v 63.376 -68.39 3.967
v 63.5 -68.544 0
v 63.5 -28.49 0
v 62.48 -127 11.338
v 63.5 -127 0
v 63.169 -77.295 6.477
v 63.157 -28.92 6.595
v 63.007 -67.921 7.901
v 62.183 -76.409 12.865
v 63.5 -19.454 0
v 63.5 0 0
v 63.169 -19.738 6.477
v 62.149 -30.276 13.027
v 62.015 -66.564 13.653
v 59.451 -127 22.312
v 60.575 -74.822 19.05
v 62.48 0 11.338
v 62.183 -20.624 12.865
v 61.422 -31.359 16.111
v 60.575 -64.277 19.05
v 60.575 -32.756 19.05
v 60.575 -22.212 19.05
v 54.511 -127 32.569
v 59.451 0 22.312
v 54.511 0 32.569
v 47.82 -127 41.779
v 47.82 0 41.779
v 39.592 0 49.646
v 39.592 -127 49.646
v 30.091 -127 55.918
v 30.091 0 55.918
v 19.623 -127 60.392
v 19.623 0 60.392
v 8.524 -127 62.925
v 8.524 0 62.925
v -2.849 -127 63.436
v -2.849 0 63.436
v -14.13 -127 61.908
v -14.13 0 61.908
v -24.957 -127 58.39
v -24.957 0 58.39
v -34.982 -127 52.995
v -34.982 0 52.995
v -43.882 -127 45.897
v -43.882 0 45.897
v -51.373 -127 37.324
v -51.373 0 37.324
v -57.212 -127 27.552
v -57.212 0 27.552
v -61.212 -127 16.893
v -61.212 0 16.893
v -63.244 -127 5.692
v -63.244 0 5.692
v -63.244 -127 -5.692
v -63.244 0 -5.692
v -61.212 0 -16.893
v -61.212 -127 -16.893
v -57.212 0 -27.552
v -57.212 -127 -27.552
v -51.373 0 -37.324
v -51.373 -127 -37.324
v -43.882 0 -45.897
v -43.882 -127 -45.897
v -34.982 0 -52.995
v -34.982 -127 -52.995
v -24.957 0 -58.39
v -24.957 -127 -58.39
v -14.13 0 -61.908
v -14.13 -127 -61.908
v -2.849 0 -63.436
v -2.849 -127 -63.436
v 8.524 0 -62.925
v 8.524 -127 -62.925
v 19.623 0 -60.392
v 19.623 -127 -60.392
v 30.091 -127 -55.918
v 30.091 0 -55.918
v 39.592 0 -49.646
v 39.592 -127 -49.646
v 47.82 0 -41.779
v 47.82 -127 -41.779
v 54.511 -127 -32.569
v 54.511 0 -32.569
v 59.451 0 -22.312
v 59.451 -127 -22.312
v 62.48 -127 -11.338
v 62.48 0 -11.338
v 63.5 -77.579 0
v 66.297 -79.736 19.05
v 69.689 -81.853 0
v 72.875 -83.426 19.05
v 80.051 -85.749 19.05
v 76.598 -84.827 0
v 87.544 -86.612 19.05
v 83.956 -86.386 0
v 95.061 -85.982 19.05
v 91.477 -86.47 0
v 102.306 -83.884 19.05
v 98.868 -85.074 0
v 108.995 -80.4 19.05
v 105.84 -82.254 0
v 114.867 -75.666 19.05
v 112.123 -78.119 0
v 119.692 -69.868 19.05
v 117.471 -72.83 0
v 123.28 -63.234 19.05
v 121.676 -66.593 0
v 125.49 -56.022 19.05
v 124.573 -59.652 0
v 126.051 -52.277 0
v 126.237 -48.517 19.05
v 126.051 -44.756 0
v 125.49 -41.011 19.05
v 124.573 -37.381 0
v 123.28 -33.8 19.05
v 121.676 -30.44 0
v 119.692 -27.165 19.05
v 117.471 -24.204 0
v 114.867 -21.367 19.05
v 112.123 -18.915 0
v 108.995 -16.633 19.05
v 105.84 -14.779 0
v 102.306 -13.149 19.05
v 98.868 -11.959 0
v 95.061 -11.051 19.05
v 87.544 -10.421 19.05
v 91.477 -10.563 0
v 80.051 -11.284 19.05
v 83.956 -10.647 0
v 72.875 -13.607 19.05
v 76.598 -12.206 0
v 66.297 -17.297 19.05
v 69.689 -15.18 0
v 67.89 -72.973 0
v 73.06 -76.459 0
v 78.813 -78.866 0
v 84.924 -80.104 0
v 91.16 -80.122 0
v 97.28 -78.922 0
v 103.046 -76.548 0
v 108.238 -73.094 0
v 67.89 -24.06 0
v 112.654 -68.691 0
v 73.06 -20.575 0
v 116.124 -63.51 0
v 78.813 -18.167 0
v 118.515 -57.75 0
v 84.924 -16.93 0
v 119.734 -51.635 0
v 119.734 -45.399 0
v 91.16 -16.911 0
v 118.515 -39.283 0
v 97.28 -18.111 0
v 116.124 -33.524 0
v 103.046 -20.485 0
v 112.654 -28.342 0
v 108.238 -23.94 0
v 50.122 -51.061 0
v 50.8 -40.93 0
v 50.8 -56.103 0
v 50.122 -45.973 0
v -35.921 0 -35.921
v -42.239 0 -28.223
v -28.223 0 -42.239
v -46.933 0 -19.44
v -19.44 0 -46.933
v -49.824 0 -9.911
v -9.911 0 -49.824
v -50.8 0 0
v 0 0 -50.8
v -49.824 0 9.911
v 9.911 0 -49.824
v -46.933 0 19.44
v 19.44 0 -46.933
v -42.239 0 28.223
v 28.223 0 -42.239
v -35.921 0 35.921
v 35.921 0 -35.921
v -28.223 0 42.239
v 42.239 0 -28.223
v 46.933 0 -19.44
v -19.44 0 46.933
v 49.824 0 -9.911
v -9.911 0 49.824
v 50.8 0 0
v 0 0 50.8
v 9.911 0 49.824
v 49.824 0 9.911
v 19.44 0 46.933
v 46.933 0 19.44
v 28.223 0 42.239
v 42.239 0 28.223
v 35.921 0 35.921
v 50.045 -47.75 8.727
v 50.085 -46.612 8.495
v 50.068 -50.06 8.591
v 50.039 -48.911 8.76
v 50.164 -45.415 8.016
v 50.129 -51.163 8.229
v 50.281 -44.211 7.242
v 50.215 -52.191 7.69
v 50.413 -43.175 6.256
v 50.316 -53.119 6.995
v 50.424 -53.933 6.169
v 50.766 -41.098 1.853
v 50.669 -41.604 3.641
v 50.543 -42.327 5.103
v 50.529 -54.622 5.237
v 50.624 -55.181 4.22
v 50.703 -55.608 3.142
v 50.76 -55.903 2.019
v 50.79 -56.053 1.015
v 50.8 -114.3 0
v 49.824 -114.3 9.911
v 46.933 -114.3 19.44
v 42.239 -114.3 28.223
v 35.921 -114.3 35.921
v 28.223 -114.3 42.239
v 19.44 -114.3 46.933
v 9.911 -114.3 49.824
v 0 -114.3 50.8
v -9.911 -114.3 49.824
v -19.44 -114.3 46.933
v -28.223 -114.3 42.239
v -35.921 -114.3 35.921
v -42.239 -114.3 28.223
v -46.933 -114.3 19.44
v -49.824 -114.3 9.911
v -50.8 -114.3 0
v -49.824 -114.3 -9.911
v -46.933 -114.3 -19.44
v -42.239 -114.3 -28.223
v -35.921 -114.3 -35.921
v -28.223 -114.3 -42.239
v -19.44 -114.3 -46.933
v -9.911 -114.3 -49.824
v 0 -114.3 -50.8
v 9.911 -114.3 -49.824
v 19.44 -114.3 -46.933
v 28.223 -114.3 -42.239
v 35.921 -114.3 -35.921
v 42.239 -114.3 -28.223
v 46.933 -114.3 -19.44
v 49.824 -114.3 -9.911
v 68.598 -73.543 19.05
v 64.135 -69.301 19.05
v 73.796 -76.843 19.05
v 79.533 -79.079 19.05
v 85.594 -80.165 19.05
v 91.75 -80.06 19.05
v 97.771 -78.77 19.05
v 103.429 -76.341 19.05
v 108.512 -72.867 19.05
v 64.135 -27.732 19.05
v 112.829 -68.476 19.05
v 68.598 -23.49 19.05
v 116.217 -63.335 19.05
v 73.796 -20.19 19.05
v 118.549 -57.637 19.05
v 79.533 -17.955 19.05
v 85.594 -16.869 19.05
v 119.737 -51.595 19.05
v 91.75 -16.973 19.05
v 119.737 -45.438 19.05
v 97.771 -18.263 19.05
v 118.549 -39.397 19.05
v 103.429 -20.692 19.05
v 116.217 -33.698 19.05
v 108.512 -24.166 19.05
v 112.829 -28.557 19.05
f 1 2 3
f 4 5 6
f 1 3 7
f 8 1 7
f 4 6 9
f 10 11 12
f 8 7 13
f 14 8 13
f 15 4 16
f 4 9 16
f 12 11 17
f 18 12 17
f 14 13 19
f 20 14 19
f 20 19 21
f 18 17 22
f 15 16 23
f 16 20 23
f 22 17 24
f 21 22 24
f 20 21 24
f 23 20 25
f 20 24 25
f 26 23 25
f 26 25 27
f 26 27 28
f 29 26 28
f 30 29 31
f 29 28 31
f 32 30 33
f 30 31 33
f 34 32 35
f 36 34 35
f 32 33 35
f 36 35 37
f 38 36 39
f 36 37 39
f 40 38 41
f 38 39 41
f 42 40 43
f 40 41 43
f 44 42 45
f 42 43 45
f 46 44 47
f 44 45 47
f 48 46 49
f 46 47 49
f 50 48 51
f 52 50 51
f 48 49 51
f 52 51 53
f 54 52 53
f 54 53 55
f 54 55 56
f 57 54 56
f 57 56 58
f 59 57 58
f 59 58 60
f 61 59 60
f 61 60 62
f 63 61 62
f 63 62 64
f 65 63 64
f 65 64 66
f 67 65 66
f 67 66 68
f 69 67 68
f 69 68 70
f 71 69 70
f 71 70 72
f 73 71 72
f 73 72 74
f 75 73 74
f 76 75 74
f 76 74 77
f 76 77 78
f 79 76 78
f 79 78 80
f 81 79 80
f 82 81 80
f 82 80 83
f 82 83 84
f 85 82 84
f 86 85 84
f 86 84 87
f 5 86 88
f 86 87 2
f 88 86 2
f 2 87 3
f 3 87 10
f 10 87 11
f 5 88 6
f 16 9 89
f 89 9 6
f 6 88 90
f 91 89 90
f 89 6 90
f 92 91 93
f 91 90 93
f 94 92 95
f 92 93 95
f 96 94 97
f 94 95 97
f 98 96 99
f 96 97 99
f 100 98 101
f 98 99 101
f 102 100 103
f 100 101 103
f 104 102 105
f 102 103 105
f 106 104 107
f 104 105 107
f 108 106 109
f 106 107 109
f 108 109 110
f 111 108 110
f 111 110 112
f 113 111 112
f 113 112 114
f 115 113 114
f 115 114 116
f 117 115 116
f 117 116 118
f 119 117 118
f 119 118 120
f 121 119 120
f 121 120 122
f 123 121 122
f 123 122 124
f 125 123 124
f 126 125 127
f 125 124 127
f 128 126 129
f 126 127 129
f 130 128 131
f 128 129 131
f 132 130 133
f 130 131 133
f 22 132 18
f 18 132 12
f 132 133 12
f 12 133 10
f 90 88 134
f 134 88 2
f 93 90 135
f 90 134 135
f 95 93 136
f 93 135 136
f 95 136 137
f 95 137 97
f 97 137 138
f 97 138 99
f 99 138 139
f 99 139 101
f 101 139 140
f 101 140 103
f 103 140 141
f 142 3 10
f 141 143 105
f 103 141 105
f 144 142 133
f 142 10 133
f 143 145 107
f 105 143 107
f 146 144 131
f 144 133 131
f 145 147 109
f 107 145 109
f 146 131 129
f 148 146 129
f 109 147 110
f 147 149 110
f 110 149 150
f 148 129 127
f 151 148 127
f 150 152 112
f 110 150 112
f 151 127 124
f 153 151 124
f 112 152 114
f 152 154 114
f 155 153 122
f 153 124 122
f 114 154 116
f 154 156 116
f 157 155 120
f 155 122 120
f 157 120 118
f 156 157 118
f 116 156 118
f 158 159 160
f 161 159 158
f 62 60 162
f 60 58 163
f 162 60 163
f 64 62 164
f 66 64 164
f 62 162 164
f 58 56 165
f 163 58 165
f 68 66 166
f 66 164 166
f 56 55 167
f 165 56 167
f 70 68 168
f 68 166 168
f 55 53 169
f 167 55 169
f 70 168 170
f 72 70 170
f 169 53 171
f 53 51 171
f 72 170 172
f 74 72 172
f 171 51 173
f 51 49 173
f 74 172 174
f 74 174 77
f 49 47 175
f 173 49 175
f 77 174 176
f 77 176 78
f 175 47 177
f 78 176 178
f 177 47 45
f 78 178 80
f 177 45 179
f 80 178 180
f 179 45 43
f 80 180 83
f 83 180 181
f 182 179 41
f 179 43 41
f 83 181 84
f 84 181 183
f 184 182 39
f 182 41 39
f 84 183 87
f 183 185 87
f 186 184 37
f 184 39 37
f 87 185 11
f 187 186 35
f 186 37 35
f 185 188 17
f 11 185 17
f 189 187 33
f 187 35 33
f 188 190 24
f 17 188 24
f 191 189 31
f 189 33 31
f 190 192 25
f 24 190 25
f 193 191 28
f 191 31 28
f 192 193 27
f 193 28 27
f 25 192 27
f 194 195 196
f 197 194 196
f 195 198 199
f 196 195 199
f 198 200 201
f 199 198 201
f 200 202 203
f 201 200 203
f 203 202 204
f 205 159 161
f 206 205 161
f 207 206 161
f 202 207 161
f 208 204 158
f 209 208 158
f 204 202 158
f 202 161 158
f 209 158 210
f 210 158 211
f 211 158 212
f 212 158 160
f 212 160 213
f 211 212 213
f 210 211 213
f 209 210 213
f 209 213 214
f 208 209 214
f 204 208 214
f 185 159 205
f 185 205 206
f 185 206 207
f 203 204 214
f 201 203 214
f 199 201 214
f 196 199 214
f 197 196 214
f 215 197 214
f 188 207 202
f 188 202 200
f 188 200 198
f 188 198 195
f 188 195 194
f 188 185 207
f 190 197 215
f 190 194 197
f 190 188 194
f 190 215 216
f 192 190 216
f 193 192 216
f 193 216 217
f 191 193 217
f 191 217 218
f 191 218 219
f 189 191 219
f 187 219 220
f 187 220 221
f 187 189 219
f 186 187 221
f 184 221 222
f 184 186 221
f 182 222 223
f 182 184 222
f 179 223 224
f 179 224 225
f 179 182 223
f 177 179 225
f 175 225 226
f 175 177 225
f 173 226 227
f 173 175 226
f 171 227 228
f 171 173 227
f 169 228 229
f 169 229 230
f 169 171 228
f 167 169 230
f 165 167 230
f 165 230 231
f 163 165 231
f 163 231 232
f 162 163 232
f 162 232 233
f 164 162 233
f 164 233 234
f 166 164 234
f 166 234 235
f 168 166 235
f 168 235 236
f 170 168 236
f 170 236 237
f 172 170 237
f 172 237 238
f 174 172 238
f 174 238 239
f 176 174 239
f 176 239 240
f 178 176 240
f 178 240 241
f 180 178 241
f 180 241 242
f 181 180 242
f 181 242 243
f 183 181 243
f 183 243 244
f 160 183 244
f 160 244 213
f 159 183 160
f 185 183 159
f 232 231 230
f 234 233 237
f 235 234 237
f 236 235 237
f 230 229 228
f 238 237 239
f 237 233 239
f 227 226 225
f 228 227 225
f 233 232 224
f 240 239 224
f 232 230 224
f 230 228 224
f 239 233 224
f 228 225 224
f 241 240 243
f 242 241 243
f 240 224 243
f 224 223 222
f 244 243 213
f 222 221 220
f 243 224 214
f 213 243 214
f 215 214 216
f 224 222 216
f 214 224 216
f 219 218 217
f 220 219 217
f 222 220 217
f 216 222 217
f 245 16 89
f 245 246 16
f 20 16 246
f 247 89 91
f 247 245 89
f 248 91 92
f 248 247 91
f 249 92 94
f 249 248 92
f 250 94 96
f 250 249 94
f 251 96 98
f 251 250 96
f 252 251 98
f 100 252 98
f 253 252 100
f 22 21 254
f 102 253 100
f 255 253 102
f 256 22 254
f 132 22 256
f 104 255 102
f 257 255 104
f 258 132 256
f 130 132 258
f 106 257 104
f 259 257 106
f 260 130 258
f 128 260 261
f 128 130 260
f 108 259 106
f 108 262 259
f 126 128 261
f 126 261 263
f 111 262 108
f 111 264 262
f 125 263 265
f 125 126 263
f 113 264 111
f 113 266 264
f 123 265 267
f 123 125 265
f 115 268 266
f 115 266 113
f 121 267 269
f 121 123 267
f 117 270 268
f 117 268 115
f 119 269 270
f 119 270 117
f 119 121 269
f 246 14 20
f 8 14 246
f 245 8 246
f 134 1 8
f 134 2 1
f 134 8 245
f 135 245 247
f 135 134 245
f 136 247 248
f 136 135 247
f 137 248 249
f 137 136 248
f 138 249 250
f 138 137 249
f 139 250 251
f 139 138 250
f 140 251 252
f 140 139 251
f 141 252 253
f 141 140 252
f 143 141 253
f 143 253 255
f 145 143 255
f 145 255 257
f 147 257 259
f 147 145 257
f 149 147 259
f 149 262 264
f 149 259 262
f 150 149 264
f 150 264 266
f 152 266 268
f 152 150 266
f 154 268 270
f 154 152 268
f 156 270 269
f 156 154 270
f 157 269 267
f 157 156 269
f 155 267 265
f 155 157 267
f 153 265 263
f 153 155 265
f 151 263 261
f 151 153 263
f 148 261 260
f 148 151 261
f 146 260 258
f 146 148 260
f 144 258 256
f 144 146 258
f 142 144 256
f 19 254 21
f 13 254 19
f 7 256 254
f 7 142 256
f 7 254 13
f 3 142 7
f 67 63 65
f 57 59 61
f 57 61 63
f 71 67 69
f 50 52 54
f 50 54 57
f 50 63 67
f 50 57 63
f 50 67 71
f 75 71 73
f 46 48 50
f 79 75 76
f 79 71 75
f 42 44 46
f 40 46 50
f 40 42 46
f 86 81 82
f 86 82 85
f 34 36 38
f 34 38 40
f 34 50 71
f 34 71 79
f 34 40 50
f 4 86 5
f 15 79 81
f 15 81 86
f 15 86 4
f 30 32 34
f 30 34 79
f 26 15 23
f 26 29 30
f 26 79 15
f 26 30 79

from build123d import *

# Parameters (mm, degrees)
F0_R     = 63.5
F1_DEPTH = 127
F2_R     = 50.8
F3_DEPTH = 114.3
F6_R     = 38.1
F6_R_2   = 31.75
F7_DEPTH = 19.05


with BuildPart() as f1:
    # F0 (on Front) → F1 (new body)
    with BuildSketch(Plane.XZ):
        Circle(F0_R)
    extrude(amount=F1_DEPTH)

    # F2 (on Front) → F3 (cut)
    with BuildSketch(Plane.XZ):
        Circle(F2_R)
    extrude(amount=F3_DEPTH, mode=Mode.SUBTRACT)

    # F6 (on Top) → F7 (join)
    with BuildSketch(Plane.XY):
        with Locations((88.1370286467, -48.5165871287)):
            Circle(F6_R)
        with Locations((88.1370286467, -48.5165871287)):
            Circle(F6_R_2, mode=Mode.SUBTRACT)
    extrude(amount=F7_DEPTH)


solid = f1.part
